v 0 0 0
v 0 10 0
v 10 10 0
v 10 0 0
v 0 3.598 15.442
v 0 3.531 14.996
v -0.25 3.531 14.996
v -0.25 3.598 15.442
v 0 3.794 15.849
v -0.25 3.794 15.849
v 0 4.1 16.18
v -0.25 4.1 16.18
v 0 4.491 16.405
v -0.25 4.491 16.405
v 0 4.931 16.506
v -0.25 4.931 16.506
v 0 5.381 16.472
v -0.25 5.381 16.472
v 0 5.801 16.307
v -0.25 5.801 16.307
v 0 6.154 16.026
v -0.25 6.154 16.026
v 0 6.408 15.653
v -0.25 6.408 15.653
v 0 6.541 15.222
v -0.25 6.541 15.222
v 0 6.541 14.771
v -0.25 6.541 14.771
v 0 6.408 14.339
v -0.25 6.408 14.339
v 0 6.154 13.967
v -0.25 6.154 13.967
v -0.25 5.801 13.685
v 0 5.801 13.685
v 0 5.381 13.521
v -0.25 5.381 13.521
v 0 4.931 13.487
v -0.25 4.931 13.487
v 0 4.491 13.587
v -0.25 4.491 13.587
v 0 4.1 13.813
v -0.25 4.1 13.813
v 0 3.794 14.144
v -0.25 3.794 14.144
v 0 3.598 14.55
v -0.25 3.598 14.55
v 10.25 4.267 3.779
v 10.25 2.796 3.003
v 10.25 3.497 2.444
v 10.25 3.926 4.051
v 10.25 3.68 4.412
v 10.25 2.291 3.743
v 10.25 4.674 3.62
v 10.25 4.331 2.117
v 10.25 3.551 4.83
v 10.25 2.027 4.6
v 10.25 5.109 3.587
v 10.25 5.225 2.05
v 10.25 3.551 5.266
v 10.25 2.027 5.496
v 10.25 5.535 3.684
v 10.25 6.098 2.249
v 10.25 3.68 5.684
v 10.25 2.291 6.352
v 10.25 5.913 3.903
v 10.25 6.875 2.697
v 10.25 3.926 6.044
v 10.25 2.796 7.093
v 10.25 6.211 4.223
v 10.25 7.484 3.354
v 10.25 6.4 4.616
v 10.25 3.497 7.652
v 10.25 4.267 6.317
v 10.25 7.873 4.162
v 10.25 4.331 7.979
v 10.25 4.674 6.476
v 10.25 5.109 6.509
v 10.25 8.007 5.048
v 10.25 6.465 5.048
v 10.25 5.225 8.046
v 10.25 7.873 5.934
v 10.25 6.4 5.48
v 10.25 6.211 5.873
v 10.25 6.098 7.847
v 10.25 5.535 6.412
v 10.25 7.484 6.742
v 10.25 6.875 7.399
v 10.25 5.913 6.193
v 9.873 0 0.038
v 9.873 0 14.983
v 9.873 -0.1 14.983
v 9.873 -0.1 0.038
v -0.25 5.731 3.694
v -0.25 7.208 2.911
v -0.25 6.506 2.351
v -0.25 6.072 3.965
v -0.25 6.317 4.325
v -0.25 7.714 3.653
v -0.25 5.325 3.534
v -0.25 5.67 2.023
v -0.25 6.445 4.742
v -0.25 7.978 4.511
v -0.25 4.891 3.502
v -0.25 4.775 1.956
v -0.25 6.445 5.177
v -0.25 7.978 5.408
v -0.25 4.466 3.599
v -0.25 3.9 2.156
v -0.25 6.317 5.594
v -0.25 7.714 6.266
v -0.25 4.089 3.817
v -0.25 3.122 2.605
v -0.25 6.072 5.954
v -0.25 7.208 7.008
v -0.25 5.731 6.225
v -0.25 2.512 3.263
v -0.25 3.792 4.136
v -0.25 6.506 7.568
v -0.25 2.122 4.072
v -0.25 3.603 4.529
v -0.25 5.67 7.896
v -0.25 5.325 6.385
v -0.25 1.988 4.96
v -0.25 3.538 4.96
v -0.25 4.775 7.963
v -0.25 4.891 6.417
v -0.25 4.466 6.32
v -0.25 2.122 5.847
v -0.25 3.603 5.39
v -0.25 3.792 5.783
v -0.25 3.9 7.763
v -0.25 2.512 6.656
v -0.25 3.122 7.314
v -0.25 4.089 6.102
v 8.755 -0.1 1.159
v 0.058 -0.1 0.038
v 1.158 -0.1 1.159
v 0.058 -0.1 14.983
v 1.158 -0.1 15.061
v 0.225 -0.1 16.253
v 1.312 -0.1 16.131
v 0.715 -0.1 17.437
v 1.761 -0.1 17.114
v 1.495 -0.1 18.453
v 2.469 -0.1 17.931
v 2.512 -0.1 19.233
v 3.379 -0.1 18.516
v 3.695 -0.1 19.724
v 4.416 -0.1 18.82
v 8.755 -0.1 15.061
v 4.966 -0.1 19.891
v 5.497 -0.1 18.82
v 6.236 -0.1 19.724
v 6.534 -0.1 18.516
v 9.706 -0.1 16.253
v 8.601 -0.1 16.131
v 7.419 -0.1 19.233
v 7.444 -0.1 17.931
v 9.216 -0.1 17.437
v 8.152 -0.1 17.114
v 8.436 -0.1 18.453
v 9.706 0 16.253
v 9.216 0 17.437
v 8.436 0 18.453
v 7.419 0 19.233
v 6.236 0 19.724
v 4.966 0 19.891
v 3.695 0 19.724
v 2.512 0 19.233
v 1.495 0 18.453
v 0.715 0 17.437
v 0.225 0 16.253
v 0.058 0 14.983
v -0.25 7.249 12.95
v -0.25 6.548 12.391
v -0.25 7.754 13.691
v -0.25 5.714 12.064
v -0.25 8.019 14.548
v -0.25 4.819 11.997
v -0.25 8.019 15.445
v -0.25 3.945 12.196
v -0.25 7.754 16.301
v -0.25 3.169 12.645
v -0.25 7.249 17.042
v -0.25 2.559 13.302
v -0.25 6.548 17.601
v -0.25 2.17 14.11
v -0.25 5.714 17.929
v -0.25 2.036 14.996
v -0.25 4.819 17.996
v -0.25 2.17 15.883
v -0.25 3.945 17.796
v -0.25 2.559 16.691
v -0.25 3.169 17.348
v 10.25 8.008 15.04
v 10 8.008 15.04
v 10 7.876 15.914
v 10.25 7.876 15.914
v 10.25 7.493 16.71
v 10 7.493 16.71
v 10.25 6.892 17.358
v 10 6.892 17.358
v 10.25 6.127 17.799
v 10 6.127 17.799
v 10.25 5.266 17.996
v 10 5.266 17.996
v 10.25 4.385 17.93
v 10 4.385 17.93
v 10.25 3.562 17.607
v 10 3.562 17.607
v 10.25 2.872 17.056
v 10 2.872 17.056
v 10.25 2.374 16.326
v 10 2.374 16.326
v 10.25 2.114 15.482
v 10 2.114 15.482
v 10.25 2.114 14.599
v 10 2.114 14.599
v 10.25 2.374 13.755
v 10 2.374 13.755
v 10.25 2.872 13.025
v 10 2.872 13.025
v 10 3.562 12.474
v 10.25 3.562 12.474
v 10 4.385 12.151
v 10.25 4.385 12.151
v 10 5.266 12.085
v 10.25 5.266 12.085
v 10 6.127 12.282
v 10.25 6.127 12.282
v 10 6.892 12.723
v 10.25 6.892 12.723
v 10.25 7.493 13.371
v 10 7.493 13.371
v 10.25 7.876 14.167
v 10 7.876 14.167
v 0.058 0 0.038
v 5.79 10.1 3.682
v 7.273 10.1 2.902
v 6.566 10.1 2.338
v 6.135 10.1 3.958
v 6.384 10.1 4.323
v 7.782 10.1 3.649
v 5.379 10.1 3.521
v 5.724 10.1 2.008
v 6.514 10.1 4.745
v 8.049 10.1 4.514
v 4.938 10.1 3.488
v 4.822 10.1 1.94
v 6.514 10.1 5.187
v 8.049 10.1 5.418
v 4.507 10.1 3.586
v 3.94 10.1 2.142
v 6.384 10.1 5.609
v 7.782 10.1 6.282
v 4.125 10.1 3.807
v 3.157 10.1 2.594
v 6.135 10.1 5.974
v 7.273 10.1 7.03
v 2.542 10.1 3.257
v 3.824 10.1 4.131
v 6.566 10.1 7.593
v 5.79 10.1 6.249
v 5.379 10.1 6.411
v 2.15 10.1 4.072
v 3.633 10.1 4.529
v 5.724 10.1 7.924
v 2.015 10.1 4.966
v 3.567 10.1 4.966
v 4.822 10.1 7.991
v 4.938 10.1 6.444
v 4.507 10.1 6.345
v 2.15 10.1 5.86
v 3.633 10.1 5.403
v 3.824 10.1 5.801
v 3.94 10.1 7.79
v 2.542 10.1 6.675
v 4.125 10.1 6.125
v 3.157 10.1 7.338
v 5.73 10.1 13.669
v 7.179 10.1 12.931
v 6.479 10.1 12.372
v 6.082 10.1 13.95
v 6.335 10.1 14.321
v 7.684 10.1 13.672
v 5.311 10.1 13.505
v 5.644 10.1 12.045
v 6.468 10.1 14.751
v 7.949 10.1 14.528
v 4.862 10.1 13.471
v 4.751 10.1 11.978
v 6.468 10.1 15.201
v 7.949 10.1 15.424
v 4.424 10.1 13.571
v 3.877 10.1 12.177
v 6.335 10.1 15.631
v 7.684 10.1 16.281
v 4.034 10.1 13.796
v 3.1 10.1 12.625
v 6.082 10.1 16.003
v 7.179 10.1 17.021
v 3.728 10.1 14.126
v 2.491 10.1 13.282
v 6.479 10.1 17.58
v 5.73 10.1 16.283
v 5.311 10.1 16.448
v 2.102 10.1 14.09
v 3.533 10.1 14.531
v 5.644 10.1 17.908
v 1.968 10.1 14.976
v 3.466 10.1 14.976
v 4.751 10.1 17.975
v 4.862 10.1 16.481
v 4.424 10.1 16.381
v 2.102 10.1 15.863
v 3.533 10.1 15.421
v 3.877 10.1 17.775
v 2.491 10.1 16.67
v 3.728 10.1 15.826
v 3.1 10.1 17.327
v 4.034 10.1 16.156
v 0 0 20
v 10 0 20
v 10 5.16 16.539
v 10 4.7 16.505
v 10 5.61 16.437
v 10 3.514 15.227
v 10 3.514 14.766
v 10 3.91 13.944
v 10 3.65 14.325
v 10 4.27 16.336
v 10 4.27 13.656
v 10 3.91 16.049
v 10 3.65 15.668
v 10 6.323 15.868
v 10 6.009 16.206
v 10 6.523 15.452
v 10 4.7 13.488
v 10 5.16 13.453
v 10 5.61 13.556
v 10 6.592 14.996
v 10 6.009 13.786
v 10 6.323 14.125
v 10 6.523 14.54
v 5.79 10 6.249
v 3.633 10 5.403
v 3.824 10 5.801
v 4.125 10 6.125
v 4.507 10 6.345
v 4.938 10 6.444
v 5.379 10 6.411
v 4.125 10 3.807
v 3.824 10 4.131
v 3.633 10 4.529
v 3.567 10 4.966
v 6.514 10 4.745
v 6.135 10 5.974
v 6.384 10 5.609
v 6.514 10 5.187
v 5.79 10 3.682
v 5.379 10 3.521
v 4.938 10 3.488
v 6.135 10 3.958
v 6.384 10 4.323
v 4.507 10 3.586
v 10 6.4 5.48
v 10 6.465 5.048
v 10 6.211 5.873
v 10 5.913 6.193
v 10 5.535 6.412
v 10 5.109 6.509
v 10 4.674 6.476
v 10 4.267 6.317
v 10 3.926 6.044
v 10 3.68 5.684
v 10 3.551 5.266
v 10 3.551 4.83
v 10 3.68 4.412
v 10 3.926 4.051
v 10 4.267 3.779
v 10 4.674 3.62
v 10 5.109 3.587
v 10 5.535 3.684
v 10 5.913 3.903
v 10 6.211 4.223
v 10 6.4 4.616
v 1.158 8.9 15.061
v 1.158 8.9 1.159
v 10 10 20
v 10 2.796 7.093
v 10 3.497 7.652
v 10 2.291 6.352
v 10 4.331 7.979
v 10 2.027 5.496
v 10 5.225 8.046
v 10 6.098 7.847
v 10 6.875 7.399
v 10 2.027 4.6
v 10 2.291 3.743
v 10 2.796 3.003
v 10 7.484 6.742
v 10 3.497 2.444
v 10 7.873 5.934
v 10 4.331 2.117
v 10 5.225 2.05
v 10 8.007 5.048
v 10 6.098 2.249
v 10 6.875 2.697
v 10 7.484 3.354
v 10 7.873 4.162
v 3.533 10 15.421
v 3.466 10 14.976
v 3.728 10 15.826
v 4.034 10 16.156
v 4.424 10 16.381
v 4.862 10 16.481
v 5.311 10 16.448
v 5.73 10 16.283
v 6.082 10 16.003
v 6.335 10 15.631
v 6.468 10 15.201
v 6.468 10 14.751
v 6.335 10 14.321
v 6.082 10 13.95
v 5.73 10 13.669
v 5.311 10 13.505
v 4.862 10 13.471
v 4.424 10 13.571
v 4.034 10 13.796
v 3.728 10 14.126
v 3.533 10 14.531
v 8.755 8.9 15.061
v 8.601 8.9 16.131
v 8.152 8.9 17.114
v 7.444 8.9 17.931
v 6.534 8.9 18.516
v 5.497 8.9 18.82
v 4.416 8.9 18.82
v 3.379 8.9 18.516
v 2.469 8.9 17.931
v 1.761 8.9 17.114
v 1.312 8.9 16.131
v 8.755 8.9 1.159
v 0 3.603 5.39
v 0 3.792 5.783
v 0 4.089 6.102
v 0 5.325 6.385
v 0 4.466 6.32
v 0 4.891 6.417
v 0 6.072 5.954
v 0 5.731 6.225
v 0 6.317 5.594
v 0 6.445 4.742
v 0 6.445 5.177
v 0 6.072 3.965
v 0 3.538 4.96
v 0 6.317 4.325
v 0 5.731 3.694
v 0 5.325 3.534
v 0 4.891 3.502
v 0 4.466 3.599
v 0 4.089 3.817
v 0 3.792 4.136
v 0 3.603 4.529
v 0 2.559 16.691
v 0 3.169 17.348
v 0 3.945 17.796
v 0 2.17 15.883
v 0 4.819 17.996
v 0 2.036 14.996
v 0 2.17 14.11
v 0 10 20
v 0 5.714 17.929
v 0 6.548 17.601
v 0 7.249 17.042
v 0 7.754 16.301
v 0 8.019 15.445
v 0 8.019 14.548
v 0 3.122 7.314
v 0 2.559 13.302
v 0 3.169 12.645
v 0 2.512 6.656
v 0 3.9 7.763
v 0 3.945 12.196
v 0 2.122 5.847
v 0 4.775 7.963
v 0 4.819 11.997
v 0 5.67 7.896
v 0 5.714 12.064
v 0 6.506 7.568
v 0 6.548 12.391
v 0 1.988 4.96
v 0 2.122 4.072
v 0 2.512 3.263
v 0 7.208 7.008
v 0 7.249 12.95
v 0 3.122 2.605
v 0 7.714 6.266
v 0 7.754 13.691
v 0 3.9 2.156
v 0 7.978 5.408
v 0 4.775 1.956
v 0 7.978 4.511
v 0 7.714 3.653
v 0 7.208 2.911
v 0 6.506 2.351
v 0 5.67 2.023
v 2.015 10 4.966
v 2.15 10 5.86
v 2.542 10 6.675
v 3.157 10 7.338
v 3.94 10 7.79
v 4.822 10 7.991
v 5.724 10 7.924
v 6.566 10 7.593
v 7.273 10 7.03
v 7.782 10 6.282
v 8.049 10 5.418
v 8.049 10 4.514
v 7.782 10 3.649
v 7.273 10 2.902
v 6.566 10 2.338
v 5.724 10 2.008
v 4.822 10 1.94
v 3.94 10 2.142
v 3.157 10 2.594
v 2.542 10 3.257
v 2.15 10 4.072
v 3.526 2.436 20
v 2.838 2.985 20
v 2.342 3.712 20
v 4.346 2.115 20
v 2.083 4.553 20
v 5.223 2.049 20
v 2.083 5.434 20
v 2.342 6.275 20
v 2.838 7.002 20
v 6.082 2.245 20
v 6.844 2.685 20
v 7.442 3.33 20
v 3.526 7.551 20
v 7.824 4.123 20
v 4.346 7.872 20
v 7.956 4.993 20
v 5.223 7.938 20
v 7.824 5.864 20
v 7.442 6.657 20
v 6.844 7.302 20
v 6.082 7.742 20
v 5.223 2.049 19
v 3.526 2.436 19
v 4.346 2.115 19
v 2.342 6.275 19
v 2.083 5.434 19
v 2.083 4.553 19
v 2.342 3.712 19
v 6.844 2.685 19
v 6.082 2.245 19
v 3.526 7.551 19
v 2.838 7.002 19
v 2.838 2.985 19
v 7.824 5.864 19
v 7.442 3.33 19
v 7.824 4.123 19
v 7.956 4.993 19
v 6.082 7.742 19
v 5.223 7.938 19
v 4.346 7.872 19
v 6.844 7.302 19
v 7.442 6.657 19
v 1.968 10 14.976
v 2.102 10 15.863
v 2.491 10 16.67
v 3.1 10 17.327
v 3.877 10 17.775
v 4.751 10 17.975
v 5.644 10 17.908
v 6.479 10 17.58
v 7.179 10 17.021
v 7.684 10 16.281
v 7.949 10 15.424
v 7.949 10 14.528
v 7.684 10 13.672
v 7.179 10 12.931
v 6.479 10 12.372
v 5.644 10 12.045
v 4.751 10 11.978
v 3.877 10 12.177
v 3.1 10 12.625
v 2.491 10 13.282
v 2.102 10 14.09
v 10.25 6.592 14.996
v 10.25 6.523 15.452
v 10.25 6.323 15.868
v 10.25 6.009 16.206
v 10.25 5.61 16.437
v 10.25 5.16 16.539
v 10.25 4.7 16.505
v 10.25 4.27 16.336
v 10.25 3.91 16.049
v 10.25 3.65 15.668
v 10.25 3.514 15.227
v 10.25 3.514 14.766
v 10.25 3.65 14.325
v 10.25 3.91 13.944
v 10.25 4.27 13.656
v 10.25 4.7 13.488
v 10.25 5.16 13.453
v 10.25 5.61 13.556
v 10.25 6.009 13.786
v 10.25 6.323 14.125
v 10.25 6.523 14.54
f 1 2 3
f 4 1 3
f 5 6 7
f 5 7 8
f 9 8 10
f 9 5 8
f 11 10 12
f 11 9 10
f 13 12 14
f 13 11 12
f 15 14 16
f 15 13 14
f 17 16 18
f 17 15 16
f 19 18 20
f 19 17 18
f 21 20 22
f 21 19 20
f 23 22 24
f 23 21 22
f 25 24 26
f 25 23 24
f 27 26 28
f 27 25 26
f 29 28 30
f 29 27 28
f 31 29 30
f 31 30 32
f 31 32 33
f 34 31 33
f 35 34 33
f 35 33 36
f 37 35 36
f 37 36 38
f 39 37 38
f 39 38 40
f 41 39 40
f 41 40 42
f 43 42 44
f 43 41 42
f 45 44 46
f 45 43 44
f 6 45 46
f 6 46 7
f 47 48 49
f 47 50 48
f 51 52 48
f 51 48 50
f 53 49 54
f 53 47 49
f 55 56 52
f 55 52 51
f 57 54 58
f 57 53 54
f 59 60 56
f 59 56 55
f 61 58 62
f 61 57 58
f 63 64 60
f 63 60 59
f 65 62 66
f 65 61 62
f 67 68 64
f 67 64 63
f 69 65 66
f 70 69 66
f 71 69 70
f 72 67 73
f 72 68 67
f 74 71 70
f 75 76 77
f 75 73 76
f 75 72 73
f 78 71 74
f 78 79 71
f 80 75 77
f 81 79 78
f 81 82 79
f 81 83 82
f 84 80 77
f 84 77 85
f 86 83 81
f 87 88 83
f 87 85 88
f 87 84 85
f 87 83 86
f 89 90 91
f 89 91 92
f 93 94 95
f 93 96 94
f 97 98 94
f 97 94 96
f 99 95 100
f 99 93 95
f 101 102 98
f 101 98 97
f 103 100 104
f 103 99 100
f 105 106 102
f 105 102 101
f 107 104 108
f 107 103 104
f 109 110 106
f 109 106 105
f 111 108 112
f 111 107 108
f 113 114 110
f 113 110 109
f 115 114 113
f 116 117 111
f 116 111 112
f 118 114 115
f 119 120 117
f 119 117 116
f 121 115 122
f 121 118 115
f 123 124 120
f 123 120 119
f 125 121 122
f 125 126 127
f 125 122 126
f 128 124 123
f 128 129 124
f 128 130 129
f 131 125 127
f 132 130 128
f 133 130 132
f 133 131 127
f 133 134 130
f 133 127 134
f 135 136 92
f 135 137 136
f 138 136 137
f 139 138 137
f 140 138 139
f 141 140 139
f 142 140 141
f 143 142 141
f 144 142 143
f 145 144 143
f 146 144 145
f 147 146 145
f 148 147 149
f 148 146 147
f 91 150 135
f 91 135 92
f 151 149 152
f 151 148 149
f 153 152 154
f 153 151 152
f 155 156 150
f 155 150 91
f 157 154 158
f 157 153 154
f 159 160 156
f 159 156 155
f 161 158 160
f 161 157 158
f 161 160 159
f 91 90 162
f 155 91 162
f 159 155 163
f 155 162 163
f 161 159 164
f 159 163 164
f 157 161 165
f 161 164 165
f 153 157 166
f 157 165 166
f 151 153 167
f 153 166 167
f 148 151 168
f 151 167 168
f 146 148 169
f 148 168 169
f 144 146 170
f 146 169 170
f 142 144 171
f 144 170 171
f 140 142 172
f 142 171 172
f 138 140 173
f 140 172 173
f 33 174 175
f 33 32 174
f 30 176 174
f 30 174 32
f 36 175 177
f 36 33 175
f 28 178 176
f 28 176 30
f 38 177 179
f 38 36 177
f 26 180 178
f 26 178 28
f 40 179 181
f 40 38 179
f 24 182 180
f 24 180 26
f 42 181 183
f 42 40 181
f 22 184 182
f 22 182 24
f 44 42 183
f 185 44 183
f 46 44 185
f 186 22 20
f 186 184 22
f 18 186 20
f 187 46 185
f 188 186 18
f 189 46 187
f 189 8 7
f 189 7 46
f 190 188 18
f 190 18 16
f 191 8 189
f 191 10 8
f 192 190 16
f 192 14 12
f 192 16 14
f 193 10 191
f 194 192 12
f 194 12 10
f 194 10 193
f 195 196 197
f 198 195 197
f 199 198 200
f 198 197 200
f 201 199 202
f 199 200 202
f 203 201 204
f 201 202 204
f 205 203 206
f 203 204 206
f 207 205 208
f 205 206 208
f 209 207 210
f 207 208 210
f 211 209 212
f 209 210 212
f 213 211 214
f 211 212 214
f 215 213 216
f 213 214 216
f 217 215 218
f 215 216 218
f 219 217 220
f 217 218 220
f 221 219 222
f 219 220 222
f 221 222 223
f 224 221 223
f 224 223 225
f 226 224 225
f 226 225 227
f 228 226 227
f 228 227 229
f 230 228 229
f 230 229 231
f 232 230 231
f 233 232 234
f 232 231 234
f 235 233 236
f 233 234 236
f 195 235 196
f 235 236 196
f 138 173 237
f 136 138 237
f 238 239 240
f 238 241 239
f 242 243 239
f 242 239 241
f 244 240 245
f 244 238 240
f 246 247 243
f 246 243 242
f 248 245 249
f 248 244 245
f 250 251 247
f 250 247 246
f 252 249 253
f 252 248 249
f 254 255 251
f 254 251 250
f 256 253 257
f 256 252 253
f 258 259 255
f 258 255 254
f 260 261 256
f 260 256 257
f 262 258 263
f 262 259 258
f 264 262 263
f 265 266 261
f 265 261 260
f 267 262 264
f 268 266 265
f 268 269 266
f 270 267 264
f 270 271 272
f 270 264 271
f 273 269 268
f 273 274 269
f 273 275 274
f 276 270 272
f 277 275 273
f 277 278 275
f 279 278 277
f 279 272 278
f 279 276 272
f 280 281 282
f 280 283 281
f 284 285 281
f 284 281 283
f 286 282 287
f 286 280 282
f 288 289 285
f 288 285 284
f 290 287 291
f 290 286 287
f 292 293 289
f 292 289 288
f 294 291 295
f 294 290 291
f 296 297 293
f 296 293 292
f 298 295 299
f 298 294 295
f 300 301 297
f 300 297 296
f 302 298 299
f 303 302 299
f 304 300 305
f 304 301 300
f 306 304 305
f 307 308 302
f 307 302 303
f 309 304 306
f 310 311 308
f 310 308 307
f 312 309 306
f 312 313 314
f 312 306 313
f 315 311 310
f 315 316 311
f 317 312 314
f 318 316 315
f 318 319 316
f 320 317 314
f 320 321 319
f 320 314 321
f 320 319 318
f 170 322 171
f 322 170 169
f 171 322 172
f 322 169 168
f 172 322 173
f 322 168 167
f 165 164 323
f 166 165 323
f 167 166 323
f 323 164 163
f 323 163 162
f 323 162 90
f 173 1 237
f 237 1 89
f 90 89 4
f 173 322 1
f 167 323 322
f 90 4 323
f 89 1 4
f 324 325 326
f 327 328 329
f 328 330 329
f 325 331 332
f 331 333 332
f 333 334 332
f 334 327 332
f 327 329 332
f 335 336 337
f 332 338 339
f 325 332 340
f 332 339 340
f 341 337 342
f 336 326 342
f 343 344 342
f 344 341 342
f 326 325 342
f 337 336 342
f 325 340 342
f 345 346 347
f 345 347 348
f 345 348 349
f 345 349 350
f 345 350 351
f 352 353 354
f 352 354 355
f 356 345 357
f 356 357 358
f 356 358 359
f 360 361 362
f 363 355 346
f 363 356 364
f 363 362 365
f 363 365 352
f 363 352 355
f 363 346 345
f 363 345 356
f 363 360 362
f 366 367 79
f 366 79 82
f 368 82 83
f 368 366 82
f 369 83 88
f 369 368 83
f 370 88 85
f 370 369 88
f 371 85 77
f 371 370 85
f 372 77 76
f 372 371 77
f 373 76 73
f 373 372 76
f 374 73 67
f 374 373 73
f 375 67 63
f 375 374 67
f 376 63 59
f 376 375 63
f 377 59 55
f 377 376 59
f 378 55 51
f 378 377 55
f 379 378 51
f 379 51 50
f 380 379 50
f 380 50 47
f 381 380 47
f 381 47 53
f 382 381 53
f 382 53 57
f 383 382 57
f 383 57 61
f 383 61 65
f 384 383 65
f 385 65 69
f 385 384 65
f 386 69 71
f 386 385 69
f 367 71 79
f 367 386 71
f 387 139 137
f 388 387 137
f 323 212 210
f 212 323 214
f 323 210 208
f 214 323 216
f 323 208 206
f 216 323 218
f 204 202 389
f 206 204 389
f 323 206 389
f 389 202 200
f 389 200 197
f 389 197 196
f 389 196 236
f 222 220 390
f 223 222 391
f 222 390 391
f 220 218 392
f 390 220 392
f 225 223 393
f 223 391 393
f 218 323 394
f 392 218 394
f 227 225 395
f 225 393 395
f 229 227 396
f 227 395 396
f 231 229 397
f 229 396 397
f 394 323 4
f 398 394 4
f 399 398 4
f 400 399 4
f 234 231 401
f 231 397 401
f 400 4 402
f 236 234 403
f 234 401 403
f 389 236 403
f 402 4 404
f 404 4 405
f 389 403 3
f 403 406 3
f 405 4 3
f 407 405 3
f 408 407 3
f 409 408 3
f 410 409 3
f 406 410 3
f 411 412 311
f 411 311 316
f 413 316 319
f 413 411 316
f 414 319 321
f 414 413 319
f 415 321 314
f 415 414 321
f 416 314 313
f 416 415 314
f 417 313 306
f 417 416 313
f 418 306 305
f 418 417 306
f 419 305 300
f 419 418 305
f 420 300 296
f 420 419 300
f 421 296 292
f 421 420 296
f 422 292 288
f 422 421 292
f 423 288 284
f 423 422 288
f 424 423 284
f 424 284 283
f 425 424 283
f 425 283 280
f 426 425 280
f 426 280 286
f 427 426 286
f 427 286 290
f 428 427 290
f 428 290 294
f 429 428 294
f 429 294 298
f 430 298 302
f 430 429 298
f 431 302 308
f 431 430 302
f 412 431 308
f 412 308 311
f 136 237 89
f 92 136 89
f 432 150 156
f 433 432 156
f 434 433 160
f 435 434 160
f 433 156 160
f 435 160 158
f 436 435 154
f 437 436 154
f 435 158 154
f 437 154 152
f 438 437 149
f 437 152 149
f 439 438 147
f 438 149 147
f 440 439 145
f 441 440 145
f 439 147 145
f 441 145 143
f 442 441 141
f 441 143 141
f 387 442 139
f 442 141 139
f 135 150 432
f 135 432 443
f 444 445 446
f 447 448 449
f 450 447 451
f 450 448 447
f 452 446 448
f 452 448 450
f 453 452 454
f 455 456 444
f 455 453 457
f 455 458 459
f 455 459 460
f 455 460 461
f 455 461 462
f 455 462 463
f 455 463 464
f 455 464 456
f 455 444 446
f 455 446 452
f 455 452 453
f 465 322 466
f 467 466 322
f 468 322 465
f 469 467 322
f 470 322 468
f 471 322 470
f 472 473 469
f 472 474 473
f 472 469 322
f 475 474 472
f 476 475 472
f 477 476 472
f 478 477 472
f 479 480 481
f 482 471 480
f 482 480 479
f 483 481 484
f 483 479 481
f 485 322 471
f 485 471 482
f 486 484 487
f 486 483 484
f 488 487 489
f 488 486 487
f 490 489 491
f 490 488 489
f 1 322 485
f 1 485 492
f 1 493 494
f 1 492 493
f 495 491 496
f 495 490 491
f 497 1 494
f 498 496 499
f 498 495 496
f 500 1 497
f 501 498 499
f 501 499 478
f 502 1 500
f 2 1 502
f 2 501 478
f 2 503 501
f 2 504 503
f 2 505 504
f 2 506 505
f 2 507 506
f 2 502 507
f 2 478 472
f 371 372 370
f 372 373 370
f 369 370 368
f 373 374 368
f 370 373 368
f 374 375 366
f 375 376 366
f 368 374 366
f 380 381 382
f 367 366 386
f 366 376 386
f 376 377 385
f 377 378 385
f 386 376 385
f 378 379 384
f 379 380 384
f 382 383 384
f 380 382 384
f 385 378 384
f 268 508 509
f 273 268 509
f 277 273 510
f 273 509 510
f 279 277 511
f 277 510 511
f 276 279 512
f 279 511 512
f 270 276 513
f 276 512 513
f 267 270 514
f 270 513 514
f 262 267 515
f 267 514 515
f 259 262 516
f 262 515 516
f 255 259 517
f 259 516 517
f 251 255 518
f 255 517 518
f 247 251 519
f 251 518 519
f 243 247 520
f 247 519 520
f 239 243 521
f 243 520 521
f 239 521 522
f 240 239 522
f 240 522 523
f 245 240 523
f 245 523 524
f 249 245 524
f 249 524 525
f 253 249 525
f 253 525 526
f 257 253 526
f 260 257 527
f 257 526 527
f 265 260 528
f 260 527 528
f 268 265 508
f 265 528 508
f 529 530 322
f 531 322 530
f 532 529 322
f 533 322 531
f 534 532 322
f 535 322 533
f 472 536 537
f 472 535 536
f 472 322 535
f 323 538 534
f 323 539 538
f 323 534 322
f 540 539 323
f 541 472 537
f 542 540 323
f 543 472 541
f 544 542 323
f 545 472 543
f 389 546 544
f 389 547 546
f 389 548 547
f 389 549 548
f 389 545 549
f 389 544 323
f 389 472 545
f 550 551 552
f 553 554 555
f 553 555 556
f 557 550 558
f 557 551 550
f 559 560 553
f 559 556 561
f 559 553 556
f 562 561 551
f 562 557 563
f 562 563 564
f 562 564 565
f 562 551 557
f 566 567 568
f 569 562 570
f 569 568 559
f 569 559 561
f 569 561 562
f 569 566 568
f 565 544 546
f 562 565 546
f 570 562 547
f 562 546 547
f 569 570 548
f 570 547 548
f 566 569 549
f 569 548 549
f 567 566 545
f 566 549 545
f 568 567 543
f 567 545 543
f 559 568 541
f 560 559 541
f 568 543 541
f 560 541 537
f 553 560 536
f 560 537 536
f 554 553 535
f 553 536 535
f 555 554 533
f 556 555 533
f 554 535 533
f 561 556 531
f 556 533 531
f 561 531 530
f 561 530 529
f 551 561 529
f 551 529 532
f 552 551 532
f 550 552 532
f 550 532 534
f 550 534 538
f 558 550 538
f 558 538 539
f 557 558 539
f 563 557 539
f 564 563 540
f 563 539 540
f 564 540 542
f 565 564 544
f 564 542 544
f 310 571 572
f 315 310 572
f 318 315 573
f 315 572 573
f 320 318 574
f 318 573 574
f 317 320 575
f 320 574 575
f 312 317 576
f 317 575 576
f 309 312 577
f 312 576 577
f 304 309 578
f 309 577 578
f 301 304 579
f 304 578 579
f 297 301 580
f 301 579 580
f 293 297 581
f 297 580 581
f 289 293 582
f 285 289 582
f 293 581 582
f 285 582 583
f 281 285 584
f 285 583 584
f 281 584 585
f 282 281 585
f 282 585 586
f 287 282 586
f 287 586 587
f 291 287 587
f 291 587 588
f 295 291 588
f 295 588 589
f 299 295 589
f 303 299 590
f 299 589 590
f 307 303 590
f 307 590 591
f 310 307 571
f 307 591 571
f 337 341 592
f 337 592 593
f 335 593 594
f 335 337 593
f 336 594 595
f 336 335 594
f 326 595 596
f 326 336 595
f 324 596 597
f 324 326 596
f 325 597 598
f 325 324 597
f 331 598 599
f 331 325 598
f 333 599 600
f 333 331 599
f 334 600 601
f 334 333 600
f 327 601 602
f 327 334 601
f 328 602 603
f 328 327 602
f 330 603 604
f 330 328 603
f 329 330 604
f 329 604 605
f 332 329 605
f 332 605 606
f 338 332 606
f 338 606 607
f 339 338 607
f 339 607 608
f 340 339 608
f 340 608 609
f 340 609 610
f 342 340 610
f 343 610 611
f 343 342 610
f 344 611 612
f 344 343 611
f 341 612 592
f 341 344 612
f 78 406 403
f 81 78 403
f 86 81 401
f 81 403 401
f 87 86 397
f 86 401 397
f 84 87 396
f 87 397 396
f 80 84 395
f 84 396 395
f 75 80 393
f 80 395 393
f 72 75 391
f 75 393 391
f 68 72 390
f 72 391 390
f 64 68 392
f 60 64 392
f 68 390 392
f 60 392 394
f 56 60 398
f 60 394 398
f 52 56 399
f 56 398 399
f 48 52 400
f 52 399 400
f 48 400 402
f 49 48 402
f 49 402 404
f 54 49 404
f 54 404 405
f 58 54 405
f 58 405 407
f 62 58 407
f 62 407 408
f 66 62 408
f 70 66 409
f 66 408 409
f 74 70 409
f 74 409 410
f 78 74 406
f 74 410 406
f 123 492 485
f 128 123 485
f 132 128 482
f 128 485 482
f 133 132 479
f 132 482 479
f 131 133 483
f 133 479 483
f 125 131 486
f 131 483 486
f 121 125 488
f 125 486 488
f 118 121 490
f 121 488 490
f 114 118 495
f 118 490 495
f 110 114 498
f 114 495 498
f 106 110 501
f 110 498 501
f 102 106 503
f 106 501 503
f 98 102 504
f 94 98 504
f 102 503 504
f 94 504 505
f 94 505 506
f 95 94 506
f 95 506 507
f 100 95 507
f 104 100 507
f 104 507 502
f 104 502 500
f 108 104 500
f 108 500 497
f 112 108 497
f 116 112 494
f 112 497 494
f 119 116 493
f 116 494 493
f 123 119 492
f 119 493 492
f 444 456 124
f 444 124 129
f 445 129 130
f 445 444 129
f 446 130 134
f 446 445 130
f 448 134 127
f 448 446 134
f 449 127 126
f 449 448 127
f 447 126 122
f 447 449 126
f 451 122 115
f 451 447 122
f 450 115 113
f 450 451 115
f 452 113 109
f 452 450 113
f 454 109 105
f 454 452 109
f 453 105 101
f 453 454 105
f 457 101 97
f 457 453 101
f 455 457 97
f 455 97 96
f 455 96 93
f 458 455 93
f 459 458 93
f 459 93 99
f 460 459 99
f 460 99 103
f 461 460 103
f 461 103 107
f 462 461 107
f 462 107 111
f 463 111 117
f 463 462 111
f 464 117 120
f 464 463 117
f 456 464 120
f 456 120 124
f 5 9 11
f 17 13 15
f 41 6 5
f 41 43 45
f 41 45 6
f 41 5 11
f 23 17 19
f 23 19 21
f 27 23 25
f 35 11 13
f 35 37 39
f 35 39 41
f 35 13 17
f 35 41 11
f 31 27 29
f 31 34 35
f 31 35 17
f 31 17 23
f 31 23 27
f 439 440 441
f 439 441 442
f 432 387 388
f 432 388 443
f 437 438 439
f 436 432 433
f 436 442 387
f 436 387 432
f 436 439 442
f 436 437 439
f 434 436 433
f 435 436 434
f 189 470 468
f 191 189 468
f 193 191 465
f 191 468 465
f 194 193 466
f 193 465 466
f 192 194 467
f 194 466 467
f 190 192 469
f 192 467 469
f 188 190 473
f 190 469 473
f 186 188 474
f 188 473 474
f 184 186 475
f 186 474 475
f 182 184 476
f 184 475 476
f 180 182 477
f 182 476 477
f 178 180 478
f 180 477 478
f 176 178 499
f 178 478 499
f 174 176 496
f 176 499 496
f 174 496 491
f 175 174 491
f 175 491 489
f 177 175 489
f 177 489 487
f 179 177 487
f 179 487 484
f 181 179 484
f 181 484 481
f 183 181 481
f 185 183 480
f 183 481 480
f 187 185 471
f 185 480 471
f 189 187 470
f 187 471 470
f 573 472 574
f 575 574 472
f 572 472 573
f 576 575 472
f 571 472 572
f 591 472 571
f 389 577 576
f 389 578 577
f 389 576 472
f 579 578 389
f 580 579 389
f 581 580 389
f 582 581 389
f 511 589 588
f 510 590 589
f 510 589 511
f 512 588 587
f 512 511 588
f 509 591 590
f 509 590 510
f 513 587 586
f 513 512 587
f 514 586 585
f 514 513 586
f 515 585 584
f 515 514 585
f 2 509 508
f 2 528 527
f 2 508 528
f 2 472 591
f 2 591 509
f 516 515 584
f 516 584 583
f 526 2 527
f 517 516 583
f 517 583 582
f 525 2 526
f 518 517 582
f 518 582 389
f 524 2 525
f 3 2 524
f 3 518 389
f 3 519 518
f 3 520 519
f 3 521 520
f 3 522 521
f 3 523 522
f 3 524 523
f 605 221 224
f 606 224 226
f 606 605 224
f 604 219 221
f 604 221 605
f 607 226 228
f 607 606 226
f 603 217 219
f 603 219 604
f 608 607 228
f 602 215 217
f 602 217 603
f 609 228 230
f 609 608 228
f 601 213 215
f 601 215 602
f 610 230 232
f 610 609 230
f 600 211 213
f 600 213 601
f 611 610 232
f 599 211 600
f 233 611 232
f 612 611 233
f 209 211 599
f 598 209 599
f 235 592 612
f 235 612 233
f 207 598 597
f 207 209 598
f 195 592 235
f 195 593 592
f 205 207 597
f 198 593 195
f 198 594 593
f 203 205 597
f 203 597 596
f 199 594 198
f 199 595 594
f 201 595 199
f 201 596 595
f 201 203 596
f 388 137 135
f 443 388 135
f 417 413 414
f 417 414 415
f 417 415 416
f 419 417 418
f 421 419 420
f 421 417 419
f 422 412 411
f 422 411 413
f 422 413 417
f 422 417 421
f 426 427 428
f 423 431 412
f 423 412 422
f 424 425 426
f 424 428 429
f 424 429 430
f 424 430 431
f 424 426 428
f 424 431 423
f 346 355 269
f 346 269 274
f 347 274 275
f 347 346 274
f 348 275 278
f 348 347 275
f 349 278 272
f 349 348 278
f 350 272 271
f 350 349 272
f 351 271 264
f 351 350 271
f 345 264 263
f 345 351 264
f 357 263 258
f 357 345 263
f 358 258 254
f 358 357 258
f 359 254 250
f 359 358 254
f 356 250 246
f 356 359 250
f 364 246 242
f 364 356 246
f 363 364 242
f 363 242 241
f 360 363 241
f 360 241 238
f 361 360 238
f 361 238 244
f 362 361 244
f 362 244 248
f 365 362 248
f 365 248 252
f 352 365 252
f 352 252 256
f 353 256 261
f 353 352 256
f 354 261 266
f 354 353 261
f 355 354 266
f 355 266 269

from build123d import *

# Parameters (mm, degrees)
BOX_W           = 10
BOX_H           = 10
BOX_DEPTH       = 20
PAD_DEPTH       = 0.1
POCKET_DEPTH    = 9
SKETCH_R        = 3.006594
SKETCH_R_2      = 1.465099
SKETCH_R_3      = 2.963699
SKETCH_R_4      = 1.547512
PAD001_DEPTH    = 0.25
SKETCH001_R     = 3.007895
SKETCH001_R_2   = 1.513665
SKETCH001_R_3   = 3.011791
SKETCH001_R_4   = 1.461759
PAD002_DEPTH    = 0.25
SKETCH004_R     = 3.006919
SKETCH004_R_2   = 1.50919
SKETCH004_R_3   = 3.034061
SKETCH004_R_4   = 1.481985
PAD003_DEPTH    = 0.1
SKETCH005_R     = 2.952769
POCKET001_DEPTH = 1


with BuildPart() as part:
    # Box → Box (new body)
    with BuildSketch(Plane.XY):
        with Locations((5, 5)):
            Rectangle(BOX_W, BOX_H)
    extrude(amount=BOX_DEPTH)

    # Sketch002 → Pad (new body)
    with BuildSketch(Plane.XZ):
        with BuildLine():
            ThreePointArc((9.873348, 14.982924), (4.965524, 19.890748), (0.0577, 14.982924))
            Line((0.0577, 14.982924), (0.0577, 0.03838))
            Line((0.0577, 0.03838), (9.873348, 0.03838))
            Line((9.873348, 14.982924), (9.873348, 0.03838))
        make_face()
    extrude(amount=PAD_DEPTH)

    # Sketch003 → Pocket (cut)
    with BuildSketch(Plane.XZ.offset(0.1)):
        with BuildLine():
            ThreePointArc((8.754824, 15.060687), (4.956489, 18.859022), (1.158155, 15.060687))
            Line((1.158155, 15.060687), (1.158155, 1.159242))
            Line((1.158155, 1.159242), (8.754824, 1.159242))
            Line((8.754824, 15.060687), (8.754824, 1.159242))
        make_face()
    extrude(amount=-POCKET_DEPTH, mode=Mode.SUBTRACT)

    # Sketch → Pad001 (new body)
    with BuildSketch(Plane.YZ.offset(10)):
        with Locations((5.000003, 5.047965)):
            Circle(SKETCH_R)
        with Locations((5.000003, 5.047965)):
            Circle(SKETCH_R_2, mode=Mode.SUBTRACT)
        with Locations((5.044216, 15.040468)):
            Circle(SKETCH_R_3)
        with Locations((5.044216, 14.996254)):
            Circle(SKETCH_R_4, mode=Mode.SUBTRACT)
    extrude(amount=PAD001_DEPTH)

    # Sketch001 → Pad002 (new body)
    with BuildSketch(Plane(origin=(0, 0, 0), x_dir=(0, -1, 0), z_dir=(-1, 0, 0))):
        with Locations((-5.044218, 14.996254)):
            Circle(SKETCH001_R)
        with Locations((-5.044218, 14.996254)):
            Circle(SKETCH001_R_2, mode=Mode.SUBTRACT)
        with Locations((-5.000003, 4.959535)):
            Circle(SKETCH001_R_3)
        with Locations((-5.000003, 4.959535)):
            Circle(SKETCH001_R_4, mode=Mode.SUBTRACT)
    extrude(amount=PAD002_DEPTH)

    # Sketch004 → Pad003 (new body)
    with BuildSketch(Plane(origin=(0, 10, 0), x_dir=(-1, 0, 0), z_dir=(0, 1, 0))):
        with Locations((-4.975261, 14.976268)):
            Circle(SKETCH004_R)
        with Locations((-4.975261, 14.976268)):
            Circle(SKETCH004_R_2, mode=Mode.SUBTRACT)
        with Locations((-5.048869, 4.965851)):
            Circle(SKETCH004_R_3)
        with Locations((-5.048869, 4.965851)):
            Circle(SKETCH004_R_4, mode=Mode.SUBTRACT)
    extrude(amount=PAD003_DEPTH)

    # Sketch005 → Pocket001 (cut)
    with BuildSketch(Plane.XY.offset(20)):
        with Locations((5.00277, 4.993419)):
            Circle(SKETCH005_R)
    extrude(amount=-POCKET001_DEPTH, mode=Mode.SUBTRACT)


solid = part.part
